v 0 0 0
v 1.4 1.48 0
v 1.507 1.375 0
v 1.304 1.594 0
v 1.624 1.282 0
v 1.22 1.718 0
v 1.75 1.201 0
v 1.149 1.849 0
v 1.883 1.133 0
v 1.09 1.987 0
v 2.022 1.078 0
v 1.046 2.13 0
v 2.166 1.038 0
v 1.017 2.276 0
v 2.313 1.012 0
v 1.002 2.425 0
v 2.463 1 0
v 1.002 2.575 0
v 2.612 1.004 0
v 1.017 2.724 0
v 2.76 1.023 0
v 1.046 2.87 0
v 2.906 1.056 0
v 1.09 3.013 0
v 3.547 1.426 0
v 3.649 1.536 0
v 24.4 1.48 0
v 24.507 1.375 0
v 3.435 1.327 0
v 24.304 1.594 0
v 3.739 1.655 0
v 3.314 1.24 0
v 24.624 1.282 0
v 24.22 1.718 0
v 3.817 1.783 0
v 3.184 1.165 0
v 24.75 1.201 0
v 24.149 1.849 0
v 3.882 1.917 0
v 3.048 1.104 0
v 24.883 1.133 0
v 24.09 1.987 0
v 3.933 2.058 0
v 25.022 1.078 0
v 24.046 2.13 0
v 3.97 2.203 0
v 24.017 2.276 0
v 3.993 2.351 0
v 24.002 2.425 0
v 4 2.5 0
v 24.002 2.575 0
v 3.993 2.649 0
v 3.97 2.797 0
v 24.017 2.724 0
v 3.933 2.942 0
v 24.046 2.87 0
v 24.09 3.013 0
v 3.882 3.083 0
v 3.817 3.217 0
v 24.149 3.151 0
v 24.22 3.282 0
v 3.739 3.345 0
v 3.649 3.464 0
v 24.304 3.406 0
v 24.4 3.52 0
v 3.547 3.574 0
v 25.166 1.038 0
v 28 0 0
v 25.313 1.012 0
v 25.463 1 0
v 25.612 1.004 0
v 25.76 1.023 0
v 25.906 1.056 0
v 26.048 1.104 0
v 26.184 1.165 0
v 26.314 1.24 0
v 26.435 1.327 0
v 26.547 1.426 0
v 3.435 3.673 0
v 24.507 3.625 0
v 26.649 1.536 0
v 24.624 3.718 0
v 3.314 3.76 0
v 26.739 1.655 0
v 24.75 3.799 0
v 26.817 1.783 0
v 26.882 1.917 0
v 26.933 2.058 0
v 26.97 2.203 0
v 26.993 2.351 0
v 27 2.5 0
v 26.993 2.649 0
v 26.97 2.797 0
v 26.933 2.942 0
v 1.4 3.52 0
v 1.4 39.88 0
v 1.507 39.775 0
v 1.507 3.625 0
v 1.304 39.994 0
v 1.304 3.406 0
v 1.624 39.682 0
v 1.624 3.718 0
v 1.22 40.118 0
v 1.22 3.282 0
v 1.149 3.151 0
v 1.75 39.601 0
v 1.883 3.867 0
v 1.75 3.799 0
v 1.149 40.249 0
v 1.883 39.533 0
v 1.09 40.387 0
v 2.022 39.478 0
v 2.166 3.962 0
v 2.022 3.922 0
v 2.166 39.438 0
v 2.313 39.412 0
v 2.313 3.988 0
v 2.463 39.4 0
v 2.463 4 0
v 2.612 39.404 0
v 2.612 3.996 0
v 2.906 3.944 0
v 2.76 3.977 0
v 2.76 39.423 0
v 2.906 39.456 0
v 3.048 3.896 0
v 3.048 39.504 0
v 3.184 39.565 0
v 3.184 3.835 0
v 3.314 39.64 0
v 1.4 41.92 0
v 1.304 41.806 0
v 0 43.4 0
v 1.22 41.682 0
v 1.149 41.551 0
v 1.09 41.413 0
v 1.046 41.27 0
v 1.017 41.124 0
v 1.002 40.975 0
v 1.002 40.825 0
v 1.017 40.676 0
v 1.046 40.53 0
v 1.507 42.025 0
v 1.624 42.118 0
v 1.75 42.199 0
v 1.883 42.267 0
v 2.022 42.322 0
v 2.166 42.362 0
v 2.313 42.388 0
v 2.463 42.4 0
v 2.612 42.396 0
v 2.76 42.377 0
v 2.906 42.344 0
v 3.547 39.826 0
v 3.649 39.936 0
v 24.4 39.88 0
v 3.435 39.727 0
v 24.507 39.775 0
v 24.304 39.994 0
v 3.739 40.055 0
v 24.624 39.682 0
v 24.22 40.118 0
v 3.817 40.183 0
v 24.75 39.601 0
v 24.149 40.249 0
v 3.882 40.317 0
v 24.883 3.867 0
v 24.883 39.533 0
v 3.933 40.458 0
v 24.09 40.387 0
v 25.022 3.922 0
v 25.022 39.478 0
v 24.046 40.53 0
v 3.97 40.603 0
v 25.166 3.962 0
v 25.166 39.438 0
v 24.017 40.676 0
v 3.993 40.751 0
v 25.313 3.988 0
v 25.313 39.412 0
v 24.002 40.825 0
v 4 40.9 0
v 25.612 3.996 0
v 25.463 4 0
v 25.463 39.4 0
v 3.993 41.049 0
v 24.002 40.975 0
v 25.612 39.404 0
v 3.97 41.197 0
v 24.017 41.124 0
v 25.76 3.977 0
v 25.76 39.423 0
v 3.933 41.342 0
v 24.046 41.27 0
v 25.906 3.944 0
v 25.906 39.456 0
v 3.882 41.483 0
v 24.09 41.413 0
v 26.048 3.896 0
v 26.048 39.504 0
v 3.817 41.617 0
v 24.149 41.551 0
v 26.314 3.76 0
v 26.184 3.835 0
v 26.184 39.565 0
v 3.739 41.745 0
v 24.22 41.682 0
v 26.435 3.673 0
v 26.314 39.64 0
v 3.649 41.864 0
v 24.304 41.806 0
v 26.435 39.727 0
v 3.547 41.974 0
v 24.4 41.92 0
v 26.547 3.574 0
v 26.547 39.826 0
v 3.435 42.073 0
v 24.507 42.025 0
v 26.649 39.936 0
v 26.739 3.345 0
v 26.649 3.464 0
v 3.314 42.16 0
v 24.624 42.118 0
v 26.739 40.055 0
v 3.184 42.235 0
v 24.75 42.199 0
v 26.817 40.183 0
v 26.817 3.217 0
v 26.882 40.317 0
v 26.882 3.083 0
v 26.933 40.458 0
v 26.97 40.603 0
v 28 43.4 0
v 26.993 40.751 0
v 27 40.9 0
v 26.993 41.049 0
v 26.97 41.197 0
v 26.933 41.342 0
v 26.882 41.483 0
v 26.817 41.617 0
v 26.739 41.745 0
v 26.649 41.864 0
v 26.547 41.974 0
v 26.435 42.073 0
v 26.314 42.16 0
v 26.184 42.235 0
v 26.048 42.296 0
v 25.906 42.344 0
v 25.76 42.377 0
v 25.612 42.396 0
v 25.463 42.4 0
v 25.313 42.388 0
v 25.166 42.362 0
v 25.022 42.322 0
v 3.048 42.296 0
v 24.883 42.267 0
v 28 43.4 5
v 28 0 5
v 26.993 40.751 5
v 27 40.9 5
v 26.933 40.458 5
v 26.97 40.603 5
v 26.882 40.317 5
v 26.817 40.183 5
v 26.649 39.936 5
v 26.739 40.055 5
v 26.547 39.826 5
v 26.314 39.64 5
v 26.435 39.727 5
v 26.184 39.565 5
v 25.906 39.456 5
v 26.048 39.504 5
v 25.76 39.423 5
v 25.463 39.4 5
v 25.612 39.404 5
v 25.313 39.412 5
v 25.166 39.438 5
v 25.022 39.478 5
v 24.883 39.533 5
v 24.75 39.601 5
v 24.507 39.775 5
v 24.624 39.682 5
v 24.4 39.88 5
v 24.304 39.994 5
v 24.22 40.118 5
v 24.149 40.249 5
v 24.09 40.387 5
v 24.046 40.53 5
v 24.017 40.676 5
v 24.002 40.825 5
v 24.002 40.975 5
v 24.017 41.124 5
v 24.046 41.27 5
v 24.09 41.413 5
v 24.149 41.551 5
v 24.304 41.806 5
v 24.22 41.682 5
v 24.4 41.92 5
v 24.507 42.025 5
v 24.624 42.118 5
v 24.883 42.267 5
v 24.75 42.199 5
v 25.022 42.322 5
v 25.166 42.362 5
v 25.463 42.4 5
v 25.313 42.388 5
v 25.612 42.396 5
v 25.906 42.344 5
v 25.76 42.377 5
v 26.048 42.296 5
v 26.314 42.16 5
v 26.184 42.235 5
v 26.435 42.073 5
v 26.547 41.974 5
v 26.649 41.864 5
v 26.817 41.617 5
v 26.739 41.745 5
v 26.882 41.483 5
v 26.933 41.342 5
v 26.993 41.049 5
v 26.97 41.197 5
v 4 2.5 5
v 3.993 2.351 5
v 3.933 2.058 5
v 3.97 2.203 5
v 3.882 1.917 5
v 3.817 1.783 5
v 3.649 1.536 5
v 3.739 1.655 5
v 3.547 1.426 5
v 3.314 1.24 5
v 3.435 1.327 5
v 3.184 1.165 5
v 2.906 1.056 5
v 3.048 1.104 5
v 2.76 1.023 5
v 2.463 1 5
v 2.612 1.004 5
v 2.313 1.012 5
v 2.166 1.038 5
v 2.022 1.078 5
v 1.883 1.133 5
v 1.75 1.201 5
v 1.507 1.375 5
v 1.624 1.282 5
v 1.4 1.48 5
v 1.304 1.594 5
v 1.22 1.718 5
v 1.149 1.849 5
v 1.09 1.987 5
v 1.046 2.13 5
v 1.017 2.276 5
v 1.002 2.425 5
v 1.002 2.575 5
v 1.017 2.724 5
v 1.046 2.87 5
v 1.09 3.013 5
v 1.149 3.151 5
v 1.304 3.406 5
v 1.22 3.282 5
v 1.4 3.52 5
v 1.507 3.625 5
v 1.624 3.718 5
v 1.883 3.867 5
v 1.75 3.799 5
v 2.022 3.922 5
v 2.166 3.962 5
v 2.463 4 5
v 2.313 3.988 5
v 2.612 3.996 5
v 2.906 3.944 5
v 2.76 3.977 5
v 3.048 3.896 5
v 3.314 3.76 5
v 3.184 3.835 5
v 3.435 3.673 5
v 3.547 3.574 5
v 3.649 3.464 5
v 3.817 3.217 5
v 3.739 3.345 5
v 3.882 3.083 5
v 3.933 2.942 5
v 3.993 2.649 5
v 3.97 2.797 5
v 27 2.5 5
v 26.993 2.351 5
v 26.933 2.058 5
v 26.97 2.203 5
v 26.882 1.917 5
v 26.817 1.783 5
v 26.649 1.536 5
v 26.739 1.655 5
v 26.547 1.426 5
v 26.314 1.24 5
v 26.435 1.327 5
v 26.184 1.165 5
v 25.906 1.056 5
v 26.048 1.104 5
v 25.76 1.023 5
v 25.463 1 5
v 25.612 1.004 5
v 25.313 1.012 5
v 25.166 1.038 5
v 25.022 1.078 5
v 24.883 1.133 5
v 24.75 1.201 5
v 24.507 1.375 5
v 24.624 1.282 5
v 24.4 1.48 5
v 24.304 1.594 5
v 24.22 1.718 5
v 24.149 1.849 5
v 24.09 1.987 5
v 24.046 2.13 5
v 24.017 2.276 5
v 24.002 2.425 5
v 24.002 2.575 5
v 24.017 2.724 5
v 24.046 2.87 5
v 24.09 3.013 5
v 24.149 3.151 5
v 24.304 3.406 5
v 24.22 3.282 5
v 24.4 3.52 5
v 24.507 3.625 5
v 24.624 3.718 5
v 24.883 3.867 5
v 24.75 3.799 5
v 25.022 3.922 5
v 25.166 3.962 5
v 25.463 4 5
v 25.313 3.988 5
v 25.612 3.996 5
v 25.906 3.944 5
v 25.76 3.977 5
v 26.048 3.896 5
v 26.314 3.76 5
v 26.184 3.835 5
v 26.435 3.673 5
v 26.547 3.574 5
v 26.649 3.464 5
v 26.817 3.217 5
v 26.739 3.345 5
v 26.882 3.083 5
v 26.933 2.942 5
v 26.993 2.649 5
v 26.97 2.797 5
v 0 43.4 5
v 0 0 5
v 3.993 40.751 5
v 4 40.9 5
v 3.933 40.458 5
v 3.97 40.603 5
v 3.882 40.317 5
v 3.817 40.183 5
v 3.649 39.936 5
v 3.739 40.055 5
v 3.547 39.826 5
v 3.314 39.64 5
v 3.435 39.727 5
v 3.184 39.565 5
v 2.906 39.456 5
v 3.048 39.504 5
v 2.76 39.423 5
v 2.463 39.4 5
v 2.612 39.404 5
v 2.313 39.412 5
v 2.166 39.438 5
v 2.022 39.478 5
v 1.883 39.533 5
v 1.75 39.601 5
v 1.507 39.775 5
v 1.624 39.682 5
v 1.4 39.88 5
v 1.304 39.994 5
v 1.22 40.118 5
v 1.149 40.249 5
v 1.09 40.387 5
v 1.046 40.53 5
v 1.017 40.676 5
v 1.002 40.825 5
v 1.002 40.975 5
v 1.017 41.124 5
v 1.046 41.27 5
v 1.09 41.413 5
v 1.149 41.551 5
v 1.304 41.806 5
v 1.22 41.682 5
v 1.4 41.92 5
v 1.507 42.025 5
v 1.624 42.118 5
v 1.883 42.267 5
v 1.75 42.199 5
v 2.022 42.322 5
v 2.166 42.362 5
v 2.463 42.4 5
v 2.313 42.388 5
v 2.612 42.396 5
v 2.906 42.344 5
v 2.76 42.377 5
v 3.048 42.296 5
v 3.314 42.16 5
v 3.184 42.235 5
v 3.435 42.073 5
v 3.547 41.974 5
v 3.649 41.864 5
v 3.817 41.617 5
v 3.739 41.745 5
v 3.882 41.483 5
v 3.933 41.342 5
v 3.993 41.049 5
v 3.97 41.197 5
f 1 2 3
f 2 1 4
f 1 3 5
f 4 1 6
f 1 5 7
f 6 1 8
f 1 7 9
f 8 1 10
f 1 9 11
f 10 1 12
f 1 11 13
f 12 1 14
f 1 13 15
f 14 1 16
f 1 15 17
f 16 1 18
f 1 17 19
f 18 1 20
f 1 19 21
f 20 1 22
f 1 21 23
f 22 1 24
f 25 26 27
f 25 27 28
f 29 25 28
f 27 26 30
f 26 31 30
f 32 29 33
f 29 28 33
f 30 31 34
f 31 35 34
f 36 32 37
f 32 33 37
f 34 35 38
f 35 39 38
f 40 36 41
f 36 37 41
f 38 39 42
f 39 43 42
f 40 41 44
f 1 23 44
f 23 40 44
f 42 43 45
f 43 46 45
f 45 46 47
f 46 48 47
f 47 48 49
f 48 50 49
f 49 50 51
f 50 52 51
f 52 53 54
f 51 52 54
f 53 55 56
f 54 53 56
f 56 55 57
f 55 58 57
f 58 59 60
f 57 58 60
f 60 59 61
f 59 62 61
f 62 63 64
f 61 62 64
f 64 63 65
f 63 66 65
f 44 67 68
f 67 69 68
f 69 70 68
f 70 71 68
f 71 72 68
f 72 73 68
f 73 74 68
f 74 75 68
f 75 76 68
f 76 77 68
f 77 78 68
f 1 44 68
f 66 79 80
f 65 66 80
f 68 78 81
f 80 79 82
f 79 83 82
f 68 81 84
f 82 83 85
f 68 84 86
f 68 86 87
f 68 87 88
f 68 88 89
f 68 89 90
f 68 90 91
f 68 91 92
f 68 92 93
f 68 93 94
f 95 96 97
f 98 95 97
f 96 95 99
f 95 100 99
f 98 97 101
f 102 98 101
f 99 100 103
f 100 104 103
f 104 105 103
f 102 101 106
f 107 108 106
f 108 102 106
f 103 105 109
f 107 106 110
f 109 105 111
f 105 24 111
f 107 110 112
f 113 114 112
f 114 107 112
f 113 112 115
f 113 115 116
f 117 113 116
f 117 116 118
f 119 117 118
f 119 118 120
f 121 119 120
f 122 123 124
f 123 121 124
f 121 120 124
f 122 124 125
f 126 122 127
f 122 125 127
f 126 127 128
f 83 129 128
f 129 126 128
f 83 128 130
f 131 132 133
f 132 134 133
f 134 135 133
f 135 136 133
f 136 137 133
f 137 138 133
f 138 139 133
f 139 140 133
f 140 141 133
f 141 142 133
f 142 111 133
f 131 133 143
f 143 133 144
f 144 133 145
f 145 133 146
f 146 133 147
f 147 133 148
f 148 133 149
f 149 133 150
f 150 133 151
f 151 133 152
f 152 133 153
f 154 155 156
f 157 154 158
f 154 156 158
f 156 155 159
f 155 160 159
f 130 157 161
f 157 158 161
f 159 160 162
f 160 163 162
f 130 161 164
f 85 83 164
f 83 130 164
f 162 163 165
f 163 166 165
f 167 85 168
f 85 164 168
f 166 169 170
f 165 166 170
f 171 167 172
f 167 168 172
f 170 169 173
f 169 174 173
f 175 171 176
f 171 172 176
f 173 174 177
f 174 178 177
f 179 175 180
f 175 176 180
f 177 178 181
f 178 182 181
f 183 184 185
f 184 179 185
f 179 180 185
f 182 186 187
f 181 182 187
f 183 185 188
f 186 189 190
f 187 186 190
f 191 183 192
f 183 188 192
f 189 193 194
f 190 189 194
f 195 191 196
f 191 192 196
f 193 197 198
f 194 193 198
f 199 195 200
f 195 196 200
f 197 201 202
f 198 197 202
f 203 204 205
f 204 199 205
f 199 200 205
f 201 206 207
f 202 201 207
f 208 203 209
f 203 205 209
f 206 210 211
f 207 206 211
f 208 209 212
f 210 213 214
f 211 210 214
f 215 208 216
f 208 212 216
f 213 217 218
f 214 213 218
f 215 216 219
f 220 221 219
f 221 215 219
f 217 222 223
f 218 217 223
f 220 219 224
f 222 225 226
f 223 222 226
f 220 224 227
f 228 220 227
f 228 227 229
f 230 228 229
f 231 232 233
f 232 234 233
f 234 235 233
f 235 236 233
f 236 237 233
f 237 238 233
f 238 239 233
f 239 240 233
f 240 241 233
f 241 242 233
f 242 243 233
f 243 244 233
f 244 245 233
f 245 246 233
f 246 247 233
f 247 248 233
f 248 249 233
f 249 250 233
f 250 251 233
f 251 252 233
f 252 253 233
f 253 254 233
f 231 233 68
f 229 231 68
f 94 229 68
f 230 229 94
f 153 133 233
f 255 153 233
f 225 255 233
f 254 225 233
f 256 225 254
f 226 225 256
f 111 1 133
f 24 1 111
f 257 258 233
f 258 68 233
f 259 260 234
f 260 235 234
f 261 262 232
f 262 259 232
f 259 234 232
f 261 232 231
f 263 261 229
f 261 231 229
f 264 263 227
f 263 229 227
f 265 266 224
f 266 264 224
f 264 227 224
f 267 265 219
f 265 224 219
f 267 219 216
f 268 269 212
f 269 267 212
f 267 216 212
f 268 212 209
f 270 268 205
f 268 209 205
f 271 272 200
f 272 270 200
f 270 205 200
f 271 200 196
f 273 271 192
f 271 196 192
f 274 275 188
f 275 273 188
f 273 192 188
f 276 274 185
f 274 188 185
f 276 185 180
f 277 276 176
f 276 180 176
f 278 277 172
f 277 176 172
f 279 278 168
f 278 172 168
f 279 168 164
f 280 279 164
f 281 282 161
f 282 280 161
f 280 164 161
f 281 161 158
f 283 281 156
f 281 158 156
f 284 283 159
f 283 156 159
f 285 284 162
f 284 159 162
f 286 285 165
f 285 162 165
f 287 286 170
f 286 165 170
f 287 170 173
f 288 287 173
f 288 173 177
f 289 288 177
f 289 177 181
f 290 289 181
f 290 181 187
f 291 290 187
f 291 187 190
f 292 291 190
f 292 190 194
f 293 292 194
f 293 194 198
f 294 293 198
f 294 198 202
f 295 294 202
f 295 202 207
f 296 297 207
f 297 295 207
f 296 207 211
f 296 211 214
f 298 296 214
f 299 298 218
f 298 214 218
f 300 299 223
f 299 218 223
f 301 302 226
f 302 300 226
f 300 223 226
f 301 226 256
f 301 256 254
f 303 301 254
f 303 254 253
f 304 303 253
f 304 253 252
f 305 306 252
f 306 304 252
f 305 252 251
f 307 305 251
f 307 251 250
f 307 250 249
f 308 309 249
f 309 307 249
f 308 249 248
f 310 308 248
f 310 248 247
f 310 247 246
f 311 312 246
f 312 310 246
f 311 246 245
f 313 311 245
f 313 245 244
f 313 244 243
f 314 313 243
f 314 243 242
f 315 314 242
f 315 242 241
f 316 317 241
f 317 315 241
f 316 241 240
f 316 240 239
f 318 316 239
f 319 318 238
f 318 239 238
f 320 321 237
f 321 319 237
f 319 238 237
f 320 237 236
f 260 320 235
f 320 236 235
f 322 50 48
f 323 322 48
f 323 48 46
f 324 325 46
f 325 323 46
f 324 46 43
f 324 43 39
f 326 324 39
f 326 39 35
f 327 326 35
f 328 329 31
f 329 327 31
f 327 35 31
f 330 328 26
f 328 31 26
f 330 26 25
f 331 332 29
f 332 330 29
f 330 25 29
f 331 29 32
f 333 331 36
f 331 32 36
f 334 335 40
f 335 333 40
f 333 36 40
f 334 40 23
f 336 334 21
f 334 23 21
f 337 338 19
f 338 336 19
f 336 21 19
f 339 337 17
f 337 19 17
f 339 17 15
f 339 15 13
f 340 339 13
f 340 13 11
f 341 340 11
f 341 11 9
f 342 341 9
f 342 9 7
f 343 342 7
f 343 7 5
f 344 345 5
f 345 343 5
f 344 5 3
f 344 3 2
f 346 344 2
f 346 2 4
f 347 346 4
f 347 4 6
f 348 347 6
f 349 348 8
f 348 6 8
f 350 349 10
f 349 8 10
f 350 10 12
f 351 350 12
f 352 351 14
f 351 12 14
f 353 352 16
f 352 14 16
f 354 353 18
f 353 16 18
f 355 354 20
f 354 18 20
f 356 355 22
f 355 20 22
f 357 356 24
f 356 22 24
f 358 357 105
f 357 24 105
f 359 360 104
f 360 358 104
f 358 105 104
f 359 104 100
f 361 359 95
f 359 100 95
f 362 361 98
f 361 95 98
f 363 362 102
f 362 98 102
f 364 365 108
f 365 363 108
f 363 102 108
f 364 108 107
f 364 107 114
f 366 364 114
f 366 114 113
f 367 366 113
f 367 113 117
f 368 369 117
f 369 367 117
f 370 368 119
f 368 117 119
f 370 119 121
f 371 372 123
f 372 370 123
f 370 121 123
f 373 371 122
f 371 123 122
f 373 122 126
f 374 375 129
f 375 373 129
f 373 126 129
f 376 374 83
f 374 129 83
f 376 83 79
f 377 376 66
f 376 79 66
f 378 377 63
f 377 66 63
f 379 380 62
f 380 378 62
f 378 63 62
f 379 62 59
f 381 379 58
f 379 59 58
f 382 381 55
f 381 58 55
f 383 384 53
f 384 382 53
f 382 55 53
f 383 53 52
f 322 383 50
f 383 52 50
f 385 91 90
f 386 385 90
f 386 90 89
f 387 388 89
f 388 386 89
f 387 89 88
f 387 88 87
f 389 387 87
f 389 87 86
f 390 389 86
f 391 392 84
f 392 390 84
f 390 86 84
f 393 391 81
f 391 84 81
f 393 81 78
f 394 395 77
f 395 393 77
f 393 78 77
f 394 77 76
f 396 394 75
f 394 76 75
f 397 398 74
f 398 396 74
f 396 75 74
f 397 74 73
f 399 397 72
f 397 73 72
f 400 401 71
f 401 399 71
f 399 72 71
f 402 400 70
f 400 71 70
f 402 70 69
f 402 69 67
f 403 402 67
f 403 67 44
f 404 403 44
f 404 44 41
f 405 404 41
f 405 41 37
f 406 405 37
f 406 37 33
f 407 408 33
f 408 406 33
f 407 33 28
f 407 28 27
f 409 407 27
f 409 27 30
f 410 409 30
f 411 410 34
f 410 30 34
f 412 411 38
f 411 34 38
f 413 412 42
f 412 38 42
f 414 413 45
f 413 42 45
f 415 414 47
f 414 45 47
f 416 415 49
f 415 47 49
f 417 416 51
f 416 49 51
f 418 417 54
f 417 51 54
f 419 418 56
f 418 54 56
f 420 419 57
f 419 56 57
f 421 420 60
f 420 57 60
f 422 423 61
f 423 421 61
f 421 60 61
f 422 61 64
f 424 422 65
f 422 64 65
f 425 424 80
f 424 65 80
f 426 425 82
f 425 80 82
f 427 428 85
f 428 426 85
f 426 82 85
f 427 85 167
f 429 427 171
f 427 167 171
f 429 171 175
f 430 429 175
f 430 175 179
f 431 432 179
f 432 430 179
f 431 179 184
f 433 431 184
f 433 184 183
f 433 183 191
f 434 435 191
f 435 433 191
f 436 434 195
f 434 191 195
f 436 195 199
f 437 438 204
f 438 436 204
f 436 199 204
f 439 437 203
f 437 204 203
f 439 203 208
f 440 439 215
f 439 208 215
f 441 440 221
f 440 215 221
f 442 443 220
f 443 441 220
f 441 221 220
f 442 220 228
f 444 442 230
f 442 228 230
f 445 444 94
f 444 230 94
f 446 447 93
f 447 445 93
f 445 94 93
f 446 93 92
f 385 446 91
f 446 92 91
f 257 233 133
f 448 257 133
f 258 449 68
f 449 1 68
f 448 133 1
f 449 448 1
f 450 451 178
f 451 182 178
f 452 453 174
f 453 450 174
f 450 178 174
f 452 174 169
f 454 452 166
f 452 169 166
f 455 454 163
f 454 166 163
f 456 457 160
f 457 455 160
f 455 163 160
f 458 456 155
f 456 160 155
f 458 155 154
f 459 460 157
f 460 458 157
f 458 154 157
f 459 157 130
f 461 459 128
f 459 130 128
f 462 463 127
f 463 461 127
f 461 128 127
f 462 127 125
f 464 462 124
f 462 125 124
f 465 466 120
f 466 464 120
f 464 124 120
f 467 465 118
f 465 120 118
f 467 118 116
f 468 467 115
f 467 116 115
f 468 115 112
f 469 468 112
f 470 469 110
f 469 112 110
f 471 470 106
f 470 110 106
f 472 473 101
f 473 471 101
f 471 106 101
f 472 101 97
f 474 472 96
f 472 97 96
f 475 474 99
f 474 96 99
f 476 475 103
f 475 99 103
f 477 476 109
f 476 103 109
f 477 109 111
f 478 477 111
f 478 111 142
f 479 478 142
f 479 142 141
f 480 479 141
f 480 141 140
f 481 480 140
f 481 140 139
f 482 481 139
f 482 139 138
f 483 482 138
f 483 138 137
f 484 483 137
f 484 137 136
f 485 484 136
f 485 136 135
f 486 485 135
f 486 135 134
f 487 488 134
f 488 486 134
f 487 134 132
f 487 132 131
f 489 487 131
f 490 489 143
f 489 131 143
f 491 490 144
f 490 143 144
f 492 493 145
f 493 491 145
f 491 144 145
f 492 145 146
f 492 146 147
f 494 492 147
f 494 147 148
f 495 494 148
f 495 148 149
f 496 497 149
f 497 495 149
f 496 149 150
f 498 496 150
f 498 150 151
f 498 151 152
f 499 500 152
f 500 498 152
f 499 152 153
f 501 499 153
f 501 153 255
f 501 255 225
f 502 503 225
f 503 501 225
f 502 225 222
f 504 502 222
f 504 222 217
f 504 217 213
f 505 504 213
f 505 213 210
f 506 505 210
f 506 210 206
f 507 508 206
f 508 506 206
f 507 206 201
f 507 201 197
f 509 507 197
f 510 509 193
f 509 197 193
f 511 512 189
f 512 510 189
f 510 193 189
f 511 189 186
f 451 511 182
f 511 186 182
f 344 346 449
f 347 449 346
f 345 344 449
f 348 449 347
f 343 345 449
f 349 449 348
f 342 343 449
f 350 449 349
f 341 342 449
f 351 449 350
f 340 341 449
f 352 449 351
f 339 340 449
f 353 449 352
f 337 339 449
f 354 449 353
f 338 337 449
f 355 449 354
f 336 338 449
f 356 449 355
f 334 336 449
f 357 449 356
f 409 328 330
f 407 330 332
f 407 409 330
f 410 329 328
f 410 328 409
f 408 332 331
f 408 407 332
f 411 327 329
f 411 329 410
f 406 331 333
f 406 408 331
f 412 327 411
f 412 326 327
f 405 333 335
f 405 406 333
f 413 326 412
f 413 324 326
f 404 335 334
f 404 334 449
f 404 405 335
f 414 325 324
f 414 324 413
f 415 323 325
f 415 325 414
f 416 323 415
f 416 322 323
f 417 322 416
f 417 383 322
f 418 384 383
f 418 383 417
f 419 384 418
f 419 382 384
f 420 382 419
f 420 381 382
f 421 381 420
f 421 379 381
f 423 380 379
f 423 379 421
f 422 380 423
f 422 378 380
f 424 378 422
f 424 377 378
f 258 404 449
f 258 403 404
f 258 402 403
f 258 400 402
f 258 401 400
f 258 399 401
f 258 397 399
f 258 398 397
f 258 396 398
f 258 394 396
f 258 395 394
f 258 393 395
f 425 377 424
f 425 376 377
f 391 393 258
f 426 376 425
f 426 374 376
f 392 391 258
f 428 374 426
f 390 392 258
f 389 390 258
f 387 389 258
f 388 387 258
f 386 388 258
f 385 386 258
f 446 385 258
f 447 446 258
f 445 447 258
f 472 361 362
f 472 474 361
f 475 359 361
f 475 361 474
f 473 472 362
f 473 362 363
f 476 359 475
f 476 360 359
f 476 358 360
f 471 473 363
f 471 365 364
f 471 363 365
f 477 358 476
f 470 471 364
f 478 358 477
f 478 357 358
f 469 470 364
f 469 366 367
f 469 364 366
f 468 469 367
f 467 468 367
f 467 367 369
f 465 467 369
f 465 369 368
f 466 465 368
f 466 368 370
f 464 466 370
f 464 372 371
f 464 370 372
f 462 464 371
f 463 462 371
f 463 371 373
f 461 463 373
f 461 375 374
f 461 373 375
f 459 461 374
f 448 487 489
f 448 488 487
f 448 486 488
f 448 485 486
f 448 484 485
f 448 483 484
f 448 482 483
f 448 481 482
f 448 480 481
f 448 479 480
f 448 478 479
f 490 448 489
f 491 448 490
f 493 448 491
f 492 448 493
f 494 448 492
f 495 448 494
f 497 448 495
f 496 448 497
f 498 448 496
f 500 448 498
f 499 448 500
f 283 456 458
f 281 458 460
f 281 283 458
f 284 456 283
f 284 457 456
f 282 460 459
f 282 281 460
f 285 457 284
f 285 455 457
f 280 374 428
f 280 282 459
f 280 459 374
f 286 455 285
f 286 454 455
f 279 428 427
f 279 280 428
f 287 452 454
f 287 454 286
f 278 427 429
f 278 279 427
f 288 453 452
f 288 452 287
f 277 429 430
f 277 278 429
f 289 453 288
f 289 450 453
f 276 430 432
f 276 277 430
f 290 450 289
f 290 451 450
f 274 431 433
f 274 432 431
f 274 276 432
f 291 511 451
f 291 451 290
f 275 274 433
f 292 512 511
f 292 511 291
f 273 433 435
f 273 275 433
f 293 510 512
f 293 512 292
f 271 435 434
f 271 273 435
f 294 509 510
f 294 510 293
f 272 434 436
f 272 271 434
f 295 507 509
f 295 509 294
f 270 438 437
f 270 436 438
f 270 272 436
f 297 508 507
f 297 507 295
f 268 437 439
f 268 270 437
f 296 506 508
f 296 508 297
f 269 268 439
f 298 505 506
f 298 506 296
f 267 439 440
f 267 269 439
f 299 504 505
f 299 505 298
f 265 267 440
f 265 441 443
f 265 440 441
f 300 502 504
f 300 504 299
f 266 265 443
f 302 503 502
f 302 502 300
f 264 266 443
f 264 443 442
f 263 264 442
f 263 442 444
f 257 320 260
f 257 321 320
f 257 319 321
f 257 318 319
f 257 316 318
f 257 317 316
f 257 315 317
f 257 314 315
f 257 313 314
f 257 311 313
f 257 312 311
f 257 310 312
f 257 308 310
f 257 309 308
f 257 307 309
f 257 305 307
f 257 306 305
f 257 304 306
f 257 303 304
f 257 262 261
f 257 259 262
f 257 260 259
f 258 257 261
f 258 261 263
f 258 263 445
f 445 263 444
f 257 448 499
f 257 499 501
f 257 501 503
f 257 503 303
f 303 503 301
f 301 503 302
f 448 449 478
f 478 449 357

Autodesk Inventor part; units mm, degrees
ref_plane "YZ Plane" through (0, 0, 0) normal (1, 0, 0) x (0, 1, 0)
ref_plane "XZ Plane" through (0, 0, 0) normal (0, 1, 0) x (-1, 0, 0)
ref_plane "XY Plane" through (0, 0, 0) normal (0, 0, 1) x (1, 0, 0)
sketch "Sketch1" plane through (0, 0, 0) normal (0, 0, 1) x (1, 0, 0)
  line L0 (0, 0) -> (28, 0)
  line L1 (28, 0) -> (28, 43.4)
  line L2 (28, 43.4) -> (0, 43.4)
  line L3 (0, 43.4) -> (0, 0)
  line L4 (2.5, 40.9) -> (25.5, 40.9) construction
  line L5 (25.5, 40.9) -> (25.5, 2.5) construction
  line L6 (25.5, 2.5) -> (2.5, 2.5) construction
  line L7 (2.5, 2.5) -> (2.5, 40.9) construction
  circle A0 centre (2.5, 40.9) radius 1.5
  circle A1 centre (25.5, 40.9) radius 1.5
  circle A2 centre (25.5, 2.5) radius 1.5
  circle A3 centre (2.5, 2.5) radius 1.5
  dimension "d0" = 28
  dimension "d1" = 43.4
  dimension "d2" = 2.5
  dimension "d3" = 3
  dimension "d4" = 3
  dimension "d5" = 3
  dimension "d6" = 3
extrude "Extrusion1" add sketch "Sketch1" along normal blind 5
properties part number "GA010" material "ABS Plastic"
